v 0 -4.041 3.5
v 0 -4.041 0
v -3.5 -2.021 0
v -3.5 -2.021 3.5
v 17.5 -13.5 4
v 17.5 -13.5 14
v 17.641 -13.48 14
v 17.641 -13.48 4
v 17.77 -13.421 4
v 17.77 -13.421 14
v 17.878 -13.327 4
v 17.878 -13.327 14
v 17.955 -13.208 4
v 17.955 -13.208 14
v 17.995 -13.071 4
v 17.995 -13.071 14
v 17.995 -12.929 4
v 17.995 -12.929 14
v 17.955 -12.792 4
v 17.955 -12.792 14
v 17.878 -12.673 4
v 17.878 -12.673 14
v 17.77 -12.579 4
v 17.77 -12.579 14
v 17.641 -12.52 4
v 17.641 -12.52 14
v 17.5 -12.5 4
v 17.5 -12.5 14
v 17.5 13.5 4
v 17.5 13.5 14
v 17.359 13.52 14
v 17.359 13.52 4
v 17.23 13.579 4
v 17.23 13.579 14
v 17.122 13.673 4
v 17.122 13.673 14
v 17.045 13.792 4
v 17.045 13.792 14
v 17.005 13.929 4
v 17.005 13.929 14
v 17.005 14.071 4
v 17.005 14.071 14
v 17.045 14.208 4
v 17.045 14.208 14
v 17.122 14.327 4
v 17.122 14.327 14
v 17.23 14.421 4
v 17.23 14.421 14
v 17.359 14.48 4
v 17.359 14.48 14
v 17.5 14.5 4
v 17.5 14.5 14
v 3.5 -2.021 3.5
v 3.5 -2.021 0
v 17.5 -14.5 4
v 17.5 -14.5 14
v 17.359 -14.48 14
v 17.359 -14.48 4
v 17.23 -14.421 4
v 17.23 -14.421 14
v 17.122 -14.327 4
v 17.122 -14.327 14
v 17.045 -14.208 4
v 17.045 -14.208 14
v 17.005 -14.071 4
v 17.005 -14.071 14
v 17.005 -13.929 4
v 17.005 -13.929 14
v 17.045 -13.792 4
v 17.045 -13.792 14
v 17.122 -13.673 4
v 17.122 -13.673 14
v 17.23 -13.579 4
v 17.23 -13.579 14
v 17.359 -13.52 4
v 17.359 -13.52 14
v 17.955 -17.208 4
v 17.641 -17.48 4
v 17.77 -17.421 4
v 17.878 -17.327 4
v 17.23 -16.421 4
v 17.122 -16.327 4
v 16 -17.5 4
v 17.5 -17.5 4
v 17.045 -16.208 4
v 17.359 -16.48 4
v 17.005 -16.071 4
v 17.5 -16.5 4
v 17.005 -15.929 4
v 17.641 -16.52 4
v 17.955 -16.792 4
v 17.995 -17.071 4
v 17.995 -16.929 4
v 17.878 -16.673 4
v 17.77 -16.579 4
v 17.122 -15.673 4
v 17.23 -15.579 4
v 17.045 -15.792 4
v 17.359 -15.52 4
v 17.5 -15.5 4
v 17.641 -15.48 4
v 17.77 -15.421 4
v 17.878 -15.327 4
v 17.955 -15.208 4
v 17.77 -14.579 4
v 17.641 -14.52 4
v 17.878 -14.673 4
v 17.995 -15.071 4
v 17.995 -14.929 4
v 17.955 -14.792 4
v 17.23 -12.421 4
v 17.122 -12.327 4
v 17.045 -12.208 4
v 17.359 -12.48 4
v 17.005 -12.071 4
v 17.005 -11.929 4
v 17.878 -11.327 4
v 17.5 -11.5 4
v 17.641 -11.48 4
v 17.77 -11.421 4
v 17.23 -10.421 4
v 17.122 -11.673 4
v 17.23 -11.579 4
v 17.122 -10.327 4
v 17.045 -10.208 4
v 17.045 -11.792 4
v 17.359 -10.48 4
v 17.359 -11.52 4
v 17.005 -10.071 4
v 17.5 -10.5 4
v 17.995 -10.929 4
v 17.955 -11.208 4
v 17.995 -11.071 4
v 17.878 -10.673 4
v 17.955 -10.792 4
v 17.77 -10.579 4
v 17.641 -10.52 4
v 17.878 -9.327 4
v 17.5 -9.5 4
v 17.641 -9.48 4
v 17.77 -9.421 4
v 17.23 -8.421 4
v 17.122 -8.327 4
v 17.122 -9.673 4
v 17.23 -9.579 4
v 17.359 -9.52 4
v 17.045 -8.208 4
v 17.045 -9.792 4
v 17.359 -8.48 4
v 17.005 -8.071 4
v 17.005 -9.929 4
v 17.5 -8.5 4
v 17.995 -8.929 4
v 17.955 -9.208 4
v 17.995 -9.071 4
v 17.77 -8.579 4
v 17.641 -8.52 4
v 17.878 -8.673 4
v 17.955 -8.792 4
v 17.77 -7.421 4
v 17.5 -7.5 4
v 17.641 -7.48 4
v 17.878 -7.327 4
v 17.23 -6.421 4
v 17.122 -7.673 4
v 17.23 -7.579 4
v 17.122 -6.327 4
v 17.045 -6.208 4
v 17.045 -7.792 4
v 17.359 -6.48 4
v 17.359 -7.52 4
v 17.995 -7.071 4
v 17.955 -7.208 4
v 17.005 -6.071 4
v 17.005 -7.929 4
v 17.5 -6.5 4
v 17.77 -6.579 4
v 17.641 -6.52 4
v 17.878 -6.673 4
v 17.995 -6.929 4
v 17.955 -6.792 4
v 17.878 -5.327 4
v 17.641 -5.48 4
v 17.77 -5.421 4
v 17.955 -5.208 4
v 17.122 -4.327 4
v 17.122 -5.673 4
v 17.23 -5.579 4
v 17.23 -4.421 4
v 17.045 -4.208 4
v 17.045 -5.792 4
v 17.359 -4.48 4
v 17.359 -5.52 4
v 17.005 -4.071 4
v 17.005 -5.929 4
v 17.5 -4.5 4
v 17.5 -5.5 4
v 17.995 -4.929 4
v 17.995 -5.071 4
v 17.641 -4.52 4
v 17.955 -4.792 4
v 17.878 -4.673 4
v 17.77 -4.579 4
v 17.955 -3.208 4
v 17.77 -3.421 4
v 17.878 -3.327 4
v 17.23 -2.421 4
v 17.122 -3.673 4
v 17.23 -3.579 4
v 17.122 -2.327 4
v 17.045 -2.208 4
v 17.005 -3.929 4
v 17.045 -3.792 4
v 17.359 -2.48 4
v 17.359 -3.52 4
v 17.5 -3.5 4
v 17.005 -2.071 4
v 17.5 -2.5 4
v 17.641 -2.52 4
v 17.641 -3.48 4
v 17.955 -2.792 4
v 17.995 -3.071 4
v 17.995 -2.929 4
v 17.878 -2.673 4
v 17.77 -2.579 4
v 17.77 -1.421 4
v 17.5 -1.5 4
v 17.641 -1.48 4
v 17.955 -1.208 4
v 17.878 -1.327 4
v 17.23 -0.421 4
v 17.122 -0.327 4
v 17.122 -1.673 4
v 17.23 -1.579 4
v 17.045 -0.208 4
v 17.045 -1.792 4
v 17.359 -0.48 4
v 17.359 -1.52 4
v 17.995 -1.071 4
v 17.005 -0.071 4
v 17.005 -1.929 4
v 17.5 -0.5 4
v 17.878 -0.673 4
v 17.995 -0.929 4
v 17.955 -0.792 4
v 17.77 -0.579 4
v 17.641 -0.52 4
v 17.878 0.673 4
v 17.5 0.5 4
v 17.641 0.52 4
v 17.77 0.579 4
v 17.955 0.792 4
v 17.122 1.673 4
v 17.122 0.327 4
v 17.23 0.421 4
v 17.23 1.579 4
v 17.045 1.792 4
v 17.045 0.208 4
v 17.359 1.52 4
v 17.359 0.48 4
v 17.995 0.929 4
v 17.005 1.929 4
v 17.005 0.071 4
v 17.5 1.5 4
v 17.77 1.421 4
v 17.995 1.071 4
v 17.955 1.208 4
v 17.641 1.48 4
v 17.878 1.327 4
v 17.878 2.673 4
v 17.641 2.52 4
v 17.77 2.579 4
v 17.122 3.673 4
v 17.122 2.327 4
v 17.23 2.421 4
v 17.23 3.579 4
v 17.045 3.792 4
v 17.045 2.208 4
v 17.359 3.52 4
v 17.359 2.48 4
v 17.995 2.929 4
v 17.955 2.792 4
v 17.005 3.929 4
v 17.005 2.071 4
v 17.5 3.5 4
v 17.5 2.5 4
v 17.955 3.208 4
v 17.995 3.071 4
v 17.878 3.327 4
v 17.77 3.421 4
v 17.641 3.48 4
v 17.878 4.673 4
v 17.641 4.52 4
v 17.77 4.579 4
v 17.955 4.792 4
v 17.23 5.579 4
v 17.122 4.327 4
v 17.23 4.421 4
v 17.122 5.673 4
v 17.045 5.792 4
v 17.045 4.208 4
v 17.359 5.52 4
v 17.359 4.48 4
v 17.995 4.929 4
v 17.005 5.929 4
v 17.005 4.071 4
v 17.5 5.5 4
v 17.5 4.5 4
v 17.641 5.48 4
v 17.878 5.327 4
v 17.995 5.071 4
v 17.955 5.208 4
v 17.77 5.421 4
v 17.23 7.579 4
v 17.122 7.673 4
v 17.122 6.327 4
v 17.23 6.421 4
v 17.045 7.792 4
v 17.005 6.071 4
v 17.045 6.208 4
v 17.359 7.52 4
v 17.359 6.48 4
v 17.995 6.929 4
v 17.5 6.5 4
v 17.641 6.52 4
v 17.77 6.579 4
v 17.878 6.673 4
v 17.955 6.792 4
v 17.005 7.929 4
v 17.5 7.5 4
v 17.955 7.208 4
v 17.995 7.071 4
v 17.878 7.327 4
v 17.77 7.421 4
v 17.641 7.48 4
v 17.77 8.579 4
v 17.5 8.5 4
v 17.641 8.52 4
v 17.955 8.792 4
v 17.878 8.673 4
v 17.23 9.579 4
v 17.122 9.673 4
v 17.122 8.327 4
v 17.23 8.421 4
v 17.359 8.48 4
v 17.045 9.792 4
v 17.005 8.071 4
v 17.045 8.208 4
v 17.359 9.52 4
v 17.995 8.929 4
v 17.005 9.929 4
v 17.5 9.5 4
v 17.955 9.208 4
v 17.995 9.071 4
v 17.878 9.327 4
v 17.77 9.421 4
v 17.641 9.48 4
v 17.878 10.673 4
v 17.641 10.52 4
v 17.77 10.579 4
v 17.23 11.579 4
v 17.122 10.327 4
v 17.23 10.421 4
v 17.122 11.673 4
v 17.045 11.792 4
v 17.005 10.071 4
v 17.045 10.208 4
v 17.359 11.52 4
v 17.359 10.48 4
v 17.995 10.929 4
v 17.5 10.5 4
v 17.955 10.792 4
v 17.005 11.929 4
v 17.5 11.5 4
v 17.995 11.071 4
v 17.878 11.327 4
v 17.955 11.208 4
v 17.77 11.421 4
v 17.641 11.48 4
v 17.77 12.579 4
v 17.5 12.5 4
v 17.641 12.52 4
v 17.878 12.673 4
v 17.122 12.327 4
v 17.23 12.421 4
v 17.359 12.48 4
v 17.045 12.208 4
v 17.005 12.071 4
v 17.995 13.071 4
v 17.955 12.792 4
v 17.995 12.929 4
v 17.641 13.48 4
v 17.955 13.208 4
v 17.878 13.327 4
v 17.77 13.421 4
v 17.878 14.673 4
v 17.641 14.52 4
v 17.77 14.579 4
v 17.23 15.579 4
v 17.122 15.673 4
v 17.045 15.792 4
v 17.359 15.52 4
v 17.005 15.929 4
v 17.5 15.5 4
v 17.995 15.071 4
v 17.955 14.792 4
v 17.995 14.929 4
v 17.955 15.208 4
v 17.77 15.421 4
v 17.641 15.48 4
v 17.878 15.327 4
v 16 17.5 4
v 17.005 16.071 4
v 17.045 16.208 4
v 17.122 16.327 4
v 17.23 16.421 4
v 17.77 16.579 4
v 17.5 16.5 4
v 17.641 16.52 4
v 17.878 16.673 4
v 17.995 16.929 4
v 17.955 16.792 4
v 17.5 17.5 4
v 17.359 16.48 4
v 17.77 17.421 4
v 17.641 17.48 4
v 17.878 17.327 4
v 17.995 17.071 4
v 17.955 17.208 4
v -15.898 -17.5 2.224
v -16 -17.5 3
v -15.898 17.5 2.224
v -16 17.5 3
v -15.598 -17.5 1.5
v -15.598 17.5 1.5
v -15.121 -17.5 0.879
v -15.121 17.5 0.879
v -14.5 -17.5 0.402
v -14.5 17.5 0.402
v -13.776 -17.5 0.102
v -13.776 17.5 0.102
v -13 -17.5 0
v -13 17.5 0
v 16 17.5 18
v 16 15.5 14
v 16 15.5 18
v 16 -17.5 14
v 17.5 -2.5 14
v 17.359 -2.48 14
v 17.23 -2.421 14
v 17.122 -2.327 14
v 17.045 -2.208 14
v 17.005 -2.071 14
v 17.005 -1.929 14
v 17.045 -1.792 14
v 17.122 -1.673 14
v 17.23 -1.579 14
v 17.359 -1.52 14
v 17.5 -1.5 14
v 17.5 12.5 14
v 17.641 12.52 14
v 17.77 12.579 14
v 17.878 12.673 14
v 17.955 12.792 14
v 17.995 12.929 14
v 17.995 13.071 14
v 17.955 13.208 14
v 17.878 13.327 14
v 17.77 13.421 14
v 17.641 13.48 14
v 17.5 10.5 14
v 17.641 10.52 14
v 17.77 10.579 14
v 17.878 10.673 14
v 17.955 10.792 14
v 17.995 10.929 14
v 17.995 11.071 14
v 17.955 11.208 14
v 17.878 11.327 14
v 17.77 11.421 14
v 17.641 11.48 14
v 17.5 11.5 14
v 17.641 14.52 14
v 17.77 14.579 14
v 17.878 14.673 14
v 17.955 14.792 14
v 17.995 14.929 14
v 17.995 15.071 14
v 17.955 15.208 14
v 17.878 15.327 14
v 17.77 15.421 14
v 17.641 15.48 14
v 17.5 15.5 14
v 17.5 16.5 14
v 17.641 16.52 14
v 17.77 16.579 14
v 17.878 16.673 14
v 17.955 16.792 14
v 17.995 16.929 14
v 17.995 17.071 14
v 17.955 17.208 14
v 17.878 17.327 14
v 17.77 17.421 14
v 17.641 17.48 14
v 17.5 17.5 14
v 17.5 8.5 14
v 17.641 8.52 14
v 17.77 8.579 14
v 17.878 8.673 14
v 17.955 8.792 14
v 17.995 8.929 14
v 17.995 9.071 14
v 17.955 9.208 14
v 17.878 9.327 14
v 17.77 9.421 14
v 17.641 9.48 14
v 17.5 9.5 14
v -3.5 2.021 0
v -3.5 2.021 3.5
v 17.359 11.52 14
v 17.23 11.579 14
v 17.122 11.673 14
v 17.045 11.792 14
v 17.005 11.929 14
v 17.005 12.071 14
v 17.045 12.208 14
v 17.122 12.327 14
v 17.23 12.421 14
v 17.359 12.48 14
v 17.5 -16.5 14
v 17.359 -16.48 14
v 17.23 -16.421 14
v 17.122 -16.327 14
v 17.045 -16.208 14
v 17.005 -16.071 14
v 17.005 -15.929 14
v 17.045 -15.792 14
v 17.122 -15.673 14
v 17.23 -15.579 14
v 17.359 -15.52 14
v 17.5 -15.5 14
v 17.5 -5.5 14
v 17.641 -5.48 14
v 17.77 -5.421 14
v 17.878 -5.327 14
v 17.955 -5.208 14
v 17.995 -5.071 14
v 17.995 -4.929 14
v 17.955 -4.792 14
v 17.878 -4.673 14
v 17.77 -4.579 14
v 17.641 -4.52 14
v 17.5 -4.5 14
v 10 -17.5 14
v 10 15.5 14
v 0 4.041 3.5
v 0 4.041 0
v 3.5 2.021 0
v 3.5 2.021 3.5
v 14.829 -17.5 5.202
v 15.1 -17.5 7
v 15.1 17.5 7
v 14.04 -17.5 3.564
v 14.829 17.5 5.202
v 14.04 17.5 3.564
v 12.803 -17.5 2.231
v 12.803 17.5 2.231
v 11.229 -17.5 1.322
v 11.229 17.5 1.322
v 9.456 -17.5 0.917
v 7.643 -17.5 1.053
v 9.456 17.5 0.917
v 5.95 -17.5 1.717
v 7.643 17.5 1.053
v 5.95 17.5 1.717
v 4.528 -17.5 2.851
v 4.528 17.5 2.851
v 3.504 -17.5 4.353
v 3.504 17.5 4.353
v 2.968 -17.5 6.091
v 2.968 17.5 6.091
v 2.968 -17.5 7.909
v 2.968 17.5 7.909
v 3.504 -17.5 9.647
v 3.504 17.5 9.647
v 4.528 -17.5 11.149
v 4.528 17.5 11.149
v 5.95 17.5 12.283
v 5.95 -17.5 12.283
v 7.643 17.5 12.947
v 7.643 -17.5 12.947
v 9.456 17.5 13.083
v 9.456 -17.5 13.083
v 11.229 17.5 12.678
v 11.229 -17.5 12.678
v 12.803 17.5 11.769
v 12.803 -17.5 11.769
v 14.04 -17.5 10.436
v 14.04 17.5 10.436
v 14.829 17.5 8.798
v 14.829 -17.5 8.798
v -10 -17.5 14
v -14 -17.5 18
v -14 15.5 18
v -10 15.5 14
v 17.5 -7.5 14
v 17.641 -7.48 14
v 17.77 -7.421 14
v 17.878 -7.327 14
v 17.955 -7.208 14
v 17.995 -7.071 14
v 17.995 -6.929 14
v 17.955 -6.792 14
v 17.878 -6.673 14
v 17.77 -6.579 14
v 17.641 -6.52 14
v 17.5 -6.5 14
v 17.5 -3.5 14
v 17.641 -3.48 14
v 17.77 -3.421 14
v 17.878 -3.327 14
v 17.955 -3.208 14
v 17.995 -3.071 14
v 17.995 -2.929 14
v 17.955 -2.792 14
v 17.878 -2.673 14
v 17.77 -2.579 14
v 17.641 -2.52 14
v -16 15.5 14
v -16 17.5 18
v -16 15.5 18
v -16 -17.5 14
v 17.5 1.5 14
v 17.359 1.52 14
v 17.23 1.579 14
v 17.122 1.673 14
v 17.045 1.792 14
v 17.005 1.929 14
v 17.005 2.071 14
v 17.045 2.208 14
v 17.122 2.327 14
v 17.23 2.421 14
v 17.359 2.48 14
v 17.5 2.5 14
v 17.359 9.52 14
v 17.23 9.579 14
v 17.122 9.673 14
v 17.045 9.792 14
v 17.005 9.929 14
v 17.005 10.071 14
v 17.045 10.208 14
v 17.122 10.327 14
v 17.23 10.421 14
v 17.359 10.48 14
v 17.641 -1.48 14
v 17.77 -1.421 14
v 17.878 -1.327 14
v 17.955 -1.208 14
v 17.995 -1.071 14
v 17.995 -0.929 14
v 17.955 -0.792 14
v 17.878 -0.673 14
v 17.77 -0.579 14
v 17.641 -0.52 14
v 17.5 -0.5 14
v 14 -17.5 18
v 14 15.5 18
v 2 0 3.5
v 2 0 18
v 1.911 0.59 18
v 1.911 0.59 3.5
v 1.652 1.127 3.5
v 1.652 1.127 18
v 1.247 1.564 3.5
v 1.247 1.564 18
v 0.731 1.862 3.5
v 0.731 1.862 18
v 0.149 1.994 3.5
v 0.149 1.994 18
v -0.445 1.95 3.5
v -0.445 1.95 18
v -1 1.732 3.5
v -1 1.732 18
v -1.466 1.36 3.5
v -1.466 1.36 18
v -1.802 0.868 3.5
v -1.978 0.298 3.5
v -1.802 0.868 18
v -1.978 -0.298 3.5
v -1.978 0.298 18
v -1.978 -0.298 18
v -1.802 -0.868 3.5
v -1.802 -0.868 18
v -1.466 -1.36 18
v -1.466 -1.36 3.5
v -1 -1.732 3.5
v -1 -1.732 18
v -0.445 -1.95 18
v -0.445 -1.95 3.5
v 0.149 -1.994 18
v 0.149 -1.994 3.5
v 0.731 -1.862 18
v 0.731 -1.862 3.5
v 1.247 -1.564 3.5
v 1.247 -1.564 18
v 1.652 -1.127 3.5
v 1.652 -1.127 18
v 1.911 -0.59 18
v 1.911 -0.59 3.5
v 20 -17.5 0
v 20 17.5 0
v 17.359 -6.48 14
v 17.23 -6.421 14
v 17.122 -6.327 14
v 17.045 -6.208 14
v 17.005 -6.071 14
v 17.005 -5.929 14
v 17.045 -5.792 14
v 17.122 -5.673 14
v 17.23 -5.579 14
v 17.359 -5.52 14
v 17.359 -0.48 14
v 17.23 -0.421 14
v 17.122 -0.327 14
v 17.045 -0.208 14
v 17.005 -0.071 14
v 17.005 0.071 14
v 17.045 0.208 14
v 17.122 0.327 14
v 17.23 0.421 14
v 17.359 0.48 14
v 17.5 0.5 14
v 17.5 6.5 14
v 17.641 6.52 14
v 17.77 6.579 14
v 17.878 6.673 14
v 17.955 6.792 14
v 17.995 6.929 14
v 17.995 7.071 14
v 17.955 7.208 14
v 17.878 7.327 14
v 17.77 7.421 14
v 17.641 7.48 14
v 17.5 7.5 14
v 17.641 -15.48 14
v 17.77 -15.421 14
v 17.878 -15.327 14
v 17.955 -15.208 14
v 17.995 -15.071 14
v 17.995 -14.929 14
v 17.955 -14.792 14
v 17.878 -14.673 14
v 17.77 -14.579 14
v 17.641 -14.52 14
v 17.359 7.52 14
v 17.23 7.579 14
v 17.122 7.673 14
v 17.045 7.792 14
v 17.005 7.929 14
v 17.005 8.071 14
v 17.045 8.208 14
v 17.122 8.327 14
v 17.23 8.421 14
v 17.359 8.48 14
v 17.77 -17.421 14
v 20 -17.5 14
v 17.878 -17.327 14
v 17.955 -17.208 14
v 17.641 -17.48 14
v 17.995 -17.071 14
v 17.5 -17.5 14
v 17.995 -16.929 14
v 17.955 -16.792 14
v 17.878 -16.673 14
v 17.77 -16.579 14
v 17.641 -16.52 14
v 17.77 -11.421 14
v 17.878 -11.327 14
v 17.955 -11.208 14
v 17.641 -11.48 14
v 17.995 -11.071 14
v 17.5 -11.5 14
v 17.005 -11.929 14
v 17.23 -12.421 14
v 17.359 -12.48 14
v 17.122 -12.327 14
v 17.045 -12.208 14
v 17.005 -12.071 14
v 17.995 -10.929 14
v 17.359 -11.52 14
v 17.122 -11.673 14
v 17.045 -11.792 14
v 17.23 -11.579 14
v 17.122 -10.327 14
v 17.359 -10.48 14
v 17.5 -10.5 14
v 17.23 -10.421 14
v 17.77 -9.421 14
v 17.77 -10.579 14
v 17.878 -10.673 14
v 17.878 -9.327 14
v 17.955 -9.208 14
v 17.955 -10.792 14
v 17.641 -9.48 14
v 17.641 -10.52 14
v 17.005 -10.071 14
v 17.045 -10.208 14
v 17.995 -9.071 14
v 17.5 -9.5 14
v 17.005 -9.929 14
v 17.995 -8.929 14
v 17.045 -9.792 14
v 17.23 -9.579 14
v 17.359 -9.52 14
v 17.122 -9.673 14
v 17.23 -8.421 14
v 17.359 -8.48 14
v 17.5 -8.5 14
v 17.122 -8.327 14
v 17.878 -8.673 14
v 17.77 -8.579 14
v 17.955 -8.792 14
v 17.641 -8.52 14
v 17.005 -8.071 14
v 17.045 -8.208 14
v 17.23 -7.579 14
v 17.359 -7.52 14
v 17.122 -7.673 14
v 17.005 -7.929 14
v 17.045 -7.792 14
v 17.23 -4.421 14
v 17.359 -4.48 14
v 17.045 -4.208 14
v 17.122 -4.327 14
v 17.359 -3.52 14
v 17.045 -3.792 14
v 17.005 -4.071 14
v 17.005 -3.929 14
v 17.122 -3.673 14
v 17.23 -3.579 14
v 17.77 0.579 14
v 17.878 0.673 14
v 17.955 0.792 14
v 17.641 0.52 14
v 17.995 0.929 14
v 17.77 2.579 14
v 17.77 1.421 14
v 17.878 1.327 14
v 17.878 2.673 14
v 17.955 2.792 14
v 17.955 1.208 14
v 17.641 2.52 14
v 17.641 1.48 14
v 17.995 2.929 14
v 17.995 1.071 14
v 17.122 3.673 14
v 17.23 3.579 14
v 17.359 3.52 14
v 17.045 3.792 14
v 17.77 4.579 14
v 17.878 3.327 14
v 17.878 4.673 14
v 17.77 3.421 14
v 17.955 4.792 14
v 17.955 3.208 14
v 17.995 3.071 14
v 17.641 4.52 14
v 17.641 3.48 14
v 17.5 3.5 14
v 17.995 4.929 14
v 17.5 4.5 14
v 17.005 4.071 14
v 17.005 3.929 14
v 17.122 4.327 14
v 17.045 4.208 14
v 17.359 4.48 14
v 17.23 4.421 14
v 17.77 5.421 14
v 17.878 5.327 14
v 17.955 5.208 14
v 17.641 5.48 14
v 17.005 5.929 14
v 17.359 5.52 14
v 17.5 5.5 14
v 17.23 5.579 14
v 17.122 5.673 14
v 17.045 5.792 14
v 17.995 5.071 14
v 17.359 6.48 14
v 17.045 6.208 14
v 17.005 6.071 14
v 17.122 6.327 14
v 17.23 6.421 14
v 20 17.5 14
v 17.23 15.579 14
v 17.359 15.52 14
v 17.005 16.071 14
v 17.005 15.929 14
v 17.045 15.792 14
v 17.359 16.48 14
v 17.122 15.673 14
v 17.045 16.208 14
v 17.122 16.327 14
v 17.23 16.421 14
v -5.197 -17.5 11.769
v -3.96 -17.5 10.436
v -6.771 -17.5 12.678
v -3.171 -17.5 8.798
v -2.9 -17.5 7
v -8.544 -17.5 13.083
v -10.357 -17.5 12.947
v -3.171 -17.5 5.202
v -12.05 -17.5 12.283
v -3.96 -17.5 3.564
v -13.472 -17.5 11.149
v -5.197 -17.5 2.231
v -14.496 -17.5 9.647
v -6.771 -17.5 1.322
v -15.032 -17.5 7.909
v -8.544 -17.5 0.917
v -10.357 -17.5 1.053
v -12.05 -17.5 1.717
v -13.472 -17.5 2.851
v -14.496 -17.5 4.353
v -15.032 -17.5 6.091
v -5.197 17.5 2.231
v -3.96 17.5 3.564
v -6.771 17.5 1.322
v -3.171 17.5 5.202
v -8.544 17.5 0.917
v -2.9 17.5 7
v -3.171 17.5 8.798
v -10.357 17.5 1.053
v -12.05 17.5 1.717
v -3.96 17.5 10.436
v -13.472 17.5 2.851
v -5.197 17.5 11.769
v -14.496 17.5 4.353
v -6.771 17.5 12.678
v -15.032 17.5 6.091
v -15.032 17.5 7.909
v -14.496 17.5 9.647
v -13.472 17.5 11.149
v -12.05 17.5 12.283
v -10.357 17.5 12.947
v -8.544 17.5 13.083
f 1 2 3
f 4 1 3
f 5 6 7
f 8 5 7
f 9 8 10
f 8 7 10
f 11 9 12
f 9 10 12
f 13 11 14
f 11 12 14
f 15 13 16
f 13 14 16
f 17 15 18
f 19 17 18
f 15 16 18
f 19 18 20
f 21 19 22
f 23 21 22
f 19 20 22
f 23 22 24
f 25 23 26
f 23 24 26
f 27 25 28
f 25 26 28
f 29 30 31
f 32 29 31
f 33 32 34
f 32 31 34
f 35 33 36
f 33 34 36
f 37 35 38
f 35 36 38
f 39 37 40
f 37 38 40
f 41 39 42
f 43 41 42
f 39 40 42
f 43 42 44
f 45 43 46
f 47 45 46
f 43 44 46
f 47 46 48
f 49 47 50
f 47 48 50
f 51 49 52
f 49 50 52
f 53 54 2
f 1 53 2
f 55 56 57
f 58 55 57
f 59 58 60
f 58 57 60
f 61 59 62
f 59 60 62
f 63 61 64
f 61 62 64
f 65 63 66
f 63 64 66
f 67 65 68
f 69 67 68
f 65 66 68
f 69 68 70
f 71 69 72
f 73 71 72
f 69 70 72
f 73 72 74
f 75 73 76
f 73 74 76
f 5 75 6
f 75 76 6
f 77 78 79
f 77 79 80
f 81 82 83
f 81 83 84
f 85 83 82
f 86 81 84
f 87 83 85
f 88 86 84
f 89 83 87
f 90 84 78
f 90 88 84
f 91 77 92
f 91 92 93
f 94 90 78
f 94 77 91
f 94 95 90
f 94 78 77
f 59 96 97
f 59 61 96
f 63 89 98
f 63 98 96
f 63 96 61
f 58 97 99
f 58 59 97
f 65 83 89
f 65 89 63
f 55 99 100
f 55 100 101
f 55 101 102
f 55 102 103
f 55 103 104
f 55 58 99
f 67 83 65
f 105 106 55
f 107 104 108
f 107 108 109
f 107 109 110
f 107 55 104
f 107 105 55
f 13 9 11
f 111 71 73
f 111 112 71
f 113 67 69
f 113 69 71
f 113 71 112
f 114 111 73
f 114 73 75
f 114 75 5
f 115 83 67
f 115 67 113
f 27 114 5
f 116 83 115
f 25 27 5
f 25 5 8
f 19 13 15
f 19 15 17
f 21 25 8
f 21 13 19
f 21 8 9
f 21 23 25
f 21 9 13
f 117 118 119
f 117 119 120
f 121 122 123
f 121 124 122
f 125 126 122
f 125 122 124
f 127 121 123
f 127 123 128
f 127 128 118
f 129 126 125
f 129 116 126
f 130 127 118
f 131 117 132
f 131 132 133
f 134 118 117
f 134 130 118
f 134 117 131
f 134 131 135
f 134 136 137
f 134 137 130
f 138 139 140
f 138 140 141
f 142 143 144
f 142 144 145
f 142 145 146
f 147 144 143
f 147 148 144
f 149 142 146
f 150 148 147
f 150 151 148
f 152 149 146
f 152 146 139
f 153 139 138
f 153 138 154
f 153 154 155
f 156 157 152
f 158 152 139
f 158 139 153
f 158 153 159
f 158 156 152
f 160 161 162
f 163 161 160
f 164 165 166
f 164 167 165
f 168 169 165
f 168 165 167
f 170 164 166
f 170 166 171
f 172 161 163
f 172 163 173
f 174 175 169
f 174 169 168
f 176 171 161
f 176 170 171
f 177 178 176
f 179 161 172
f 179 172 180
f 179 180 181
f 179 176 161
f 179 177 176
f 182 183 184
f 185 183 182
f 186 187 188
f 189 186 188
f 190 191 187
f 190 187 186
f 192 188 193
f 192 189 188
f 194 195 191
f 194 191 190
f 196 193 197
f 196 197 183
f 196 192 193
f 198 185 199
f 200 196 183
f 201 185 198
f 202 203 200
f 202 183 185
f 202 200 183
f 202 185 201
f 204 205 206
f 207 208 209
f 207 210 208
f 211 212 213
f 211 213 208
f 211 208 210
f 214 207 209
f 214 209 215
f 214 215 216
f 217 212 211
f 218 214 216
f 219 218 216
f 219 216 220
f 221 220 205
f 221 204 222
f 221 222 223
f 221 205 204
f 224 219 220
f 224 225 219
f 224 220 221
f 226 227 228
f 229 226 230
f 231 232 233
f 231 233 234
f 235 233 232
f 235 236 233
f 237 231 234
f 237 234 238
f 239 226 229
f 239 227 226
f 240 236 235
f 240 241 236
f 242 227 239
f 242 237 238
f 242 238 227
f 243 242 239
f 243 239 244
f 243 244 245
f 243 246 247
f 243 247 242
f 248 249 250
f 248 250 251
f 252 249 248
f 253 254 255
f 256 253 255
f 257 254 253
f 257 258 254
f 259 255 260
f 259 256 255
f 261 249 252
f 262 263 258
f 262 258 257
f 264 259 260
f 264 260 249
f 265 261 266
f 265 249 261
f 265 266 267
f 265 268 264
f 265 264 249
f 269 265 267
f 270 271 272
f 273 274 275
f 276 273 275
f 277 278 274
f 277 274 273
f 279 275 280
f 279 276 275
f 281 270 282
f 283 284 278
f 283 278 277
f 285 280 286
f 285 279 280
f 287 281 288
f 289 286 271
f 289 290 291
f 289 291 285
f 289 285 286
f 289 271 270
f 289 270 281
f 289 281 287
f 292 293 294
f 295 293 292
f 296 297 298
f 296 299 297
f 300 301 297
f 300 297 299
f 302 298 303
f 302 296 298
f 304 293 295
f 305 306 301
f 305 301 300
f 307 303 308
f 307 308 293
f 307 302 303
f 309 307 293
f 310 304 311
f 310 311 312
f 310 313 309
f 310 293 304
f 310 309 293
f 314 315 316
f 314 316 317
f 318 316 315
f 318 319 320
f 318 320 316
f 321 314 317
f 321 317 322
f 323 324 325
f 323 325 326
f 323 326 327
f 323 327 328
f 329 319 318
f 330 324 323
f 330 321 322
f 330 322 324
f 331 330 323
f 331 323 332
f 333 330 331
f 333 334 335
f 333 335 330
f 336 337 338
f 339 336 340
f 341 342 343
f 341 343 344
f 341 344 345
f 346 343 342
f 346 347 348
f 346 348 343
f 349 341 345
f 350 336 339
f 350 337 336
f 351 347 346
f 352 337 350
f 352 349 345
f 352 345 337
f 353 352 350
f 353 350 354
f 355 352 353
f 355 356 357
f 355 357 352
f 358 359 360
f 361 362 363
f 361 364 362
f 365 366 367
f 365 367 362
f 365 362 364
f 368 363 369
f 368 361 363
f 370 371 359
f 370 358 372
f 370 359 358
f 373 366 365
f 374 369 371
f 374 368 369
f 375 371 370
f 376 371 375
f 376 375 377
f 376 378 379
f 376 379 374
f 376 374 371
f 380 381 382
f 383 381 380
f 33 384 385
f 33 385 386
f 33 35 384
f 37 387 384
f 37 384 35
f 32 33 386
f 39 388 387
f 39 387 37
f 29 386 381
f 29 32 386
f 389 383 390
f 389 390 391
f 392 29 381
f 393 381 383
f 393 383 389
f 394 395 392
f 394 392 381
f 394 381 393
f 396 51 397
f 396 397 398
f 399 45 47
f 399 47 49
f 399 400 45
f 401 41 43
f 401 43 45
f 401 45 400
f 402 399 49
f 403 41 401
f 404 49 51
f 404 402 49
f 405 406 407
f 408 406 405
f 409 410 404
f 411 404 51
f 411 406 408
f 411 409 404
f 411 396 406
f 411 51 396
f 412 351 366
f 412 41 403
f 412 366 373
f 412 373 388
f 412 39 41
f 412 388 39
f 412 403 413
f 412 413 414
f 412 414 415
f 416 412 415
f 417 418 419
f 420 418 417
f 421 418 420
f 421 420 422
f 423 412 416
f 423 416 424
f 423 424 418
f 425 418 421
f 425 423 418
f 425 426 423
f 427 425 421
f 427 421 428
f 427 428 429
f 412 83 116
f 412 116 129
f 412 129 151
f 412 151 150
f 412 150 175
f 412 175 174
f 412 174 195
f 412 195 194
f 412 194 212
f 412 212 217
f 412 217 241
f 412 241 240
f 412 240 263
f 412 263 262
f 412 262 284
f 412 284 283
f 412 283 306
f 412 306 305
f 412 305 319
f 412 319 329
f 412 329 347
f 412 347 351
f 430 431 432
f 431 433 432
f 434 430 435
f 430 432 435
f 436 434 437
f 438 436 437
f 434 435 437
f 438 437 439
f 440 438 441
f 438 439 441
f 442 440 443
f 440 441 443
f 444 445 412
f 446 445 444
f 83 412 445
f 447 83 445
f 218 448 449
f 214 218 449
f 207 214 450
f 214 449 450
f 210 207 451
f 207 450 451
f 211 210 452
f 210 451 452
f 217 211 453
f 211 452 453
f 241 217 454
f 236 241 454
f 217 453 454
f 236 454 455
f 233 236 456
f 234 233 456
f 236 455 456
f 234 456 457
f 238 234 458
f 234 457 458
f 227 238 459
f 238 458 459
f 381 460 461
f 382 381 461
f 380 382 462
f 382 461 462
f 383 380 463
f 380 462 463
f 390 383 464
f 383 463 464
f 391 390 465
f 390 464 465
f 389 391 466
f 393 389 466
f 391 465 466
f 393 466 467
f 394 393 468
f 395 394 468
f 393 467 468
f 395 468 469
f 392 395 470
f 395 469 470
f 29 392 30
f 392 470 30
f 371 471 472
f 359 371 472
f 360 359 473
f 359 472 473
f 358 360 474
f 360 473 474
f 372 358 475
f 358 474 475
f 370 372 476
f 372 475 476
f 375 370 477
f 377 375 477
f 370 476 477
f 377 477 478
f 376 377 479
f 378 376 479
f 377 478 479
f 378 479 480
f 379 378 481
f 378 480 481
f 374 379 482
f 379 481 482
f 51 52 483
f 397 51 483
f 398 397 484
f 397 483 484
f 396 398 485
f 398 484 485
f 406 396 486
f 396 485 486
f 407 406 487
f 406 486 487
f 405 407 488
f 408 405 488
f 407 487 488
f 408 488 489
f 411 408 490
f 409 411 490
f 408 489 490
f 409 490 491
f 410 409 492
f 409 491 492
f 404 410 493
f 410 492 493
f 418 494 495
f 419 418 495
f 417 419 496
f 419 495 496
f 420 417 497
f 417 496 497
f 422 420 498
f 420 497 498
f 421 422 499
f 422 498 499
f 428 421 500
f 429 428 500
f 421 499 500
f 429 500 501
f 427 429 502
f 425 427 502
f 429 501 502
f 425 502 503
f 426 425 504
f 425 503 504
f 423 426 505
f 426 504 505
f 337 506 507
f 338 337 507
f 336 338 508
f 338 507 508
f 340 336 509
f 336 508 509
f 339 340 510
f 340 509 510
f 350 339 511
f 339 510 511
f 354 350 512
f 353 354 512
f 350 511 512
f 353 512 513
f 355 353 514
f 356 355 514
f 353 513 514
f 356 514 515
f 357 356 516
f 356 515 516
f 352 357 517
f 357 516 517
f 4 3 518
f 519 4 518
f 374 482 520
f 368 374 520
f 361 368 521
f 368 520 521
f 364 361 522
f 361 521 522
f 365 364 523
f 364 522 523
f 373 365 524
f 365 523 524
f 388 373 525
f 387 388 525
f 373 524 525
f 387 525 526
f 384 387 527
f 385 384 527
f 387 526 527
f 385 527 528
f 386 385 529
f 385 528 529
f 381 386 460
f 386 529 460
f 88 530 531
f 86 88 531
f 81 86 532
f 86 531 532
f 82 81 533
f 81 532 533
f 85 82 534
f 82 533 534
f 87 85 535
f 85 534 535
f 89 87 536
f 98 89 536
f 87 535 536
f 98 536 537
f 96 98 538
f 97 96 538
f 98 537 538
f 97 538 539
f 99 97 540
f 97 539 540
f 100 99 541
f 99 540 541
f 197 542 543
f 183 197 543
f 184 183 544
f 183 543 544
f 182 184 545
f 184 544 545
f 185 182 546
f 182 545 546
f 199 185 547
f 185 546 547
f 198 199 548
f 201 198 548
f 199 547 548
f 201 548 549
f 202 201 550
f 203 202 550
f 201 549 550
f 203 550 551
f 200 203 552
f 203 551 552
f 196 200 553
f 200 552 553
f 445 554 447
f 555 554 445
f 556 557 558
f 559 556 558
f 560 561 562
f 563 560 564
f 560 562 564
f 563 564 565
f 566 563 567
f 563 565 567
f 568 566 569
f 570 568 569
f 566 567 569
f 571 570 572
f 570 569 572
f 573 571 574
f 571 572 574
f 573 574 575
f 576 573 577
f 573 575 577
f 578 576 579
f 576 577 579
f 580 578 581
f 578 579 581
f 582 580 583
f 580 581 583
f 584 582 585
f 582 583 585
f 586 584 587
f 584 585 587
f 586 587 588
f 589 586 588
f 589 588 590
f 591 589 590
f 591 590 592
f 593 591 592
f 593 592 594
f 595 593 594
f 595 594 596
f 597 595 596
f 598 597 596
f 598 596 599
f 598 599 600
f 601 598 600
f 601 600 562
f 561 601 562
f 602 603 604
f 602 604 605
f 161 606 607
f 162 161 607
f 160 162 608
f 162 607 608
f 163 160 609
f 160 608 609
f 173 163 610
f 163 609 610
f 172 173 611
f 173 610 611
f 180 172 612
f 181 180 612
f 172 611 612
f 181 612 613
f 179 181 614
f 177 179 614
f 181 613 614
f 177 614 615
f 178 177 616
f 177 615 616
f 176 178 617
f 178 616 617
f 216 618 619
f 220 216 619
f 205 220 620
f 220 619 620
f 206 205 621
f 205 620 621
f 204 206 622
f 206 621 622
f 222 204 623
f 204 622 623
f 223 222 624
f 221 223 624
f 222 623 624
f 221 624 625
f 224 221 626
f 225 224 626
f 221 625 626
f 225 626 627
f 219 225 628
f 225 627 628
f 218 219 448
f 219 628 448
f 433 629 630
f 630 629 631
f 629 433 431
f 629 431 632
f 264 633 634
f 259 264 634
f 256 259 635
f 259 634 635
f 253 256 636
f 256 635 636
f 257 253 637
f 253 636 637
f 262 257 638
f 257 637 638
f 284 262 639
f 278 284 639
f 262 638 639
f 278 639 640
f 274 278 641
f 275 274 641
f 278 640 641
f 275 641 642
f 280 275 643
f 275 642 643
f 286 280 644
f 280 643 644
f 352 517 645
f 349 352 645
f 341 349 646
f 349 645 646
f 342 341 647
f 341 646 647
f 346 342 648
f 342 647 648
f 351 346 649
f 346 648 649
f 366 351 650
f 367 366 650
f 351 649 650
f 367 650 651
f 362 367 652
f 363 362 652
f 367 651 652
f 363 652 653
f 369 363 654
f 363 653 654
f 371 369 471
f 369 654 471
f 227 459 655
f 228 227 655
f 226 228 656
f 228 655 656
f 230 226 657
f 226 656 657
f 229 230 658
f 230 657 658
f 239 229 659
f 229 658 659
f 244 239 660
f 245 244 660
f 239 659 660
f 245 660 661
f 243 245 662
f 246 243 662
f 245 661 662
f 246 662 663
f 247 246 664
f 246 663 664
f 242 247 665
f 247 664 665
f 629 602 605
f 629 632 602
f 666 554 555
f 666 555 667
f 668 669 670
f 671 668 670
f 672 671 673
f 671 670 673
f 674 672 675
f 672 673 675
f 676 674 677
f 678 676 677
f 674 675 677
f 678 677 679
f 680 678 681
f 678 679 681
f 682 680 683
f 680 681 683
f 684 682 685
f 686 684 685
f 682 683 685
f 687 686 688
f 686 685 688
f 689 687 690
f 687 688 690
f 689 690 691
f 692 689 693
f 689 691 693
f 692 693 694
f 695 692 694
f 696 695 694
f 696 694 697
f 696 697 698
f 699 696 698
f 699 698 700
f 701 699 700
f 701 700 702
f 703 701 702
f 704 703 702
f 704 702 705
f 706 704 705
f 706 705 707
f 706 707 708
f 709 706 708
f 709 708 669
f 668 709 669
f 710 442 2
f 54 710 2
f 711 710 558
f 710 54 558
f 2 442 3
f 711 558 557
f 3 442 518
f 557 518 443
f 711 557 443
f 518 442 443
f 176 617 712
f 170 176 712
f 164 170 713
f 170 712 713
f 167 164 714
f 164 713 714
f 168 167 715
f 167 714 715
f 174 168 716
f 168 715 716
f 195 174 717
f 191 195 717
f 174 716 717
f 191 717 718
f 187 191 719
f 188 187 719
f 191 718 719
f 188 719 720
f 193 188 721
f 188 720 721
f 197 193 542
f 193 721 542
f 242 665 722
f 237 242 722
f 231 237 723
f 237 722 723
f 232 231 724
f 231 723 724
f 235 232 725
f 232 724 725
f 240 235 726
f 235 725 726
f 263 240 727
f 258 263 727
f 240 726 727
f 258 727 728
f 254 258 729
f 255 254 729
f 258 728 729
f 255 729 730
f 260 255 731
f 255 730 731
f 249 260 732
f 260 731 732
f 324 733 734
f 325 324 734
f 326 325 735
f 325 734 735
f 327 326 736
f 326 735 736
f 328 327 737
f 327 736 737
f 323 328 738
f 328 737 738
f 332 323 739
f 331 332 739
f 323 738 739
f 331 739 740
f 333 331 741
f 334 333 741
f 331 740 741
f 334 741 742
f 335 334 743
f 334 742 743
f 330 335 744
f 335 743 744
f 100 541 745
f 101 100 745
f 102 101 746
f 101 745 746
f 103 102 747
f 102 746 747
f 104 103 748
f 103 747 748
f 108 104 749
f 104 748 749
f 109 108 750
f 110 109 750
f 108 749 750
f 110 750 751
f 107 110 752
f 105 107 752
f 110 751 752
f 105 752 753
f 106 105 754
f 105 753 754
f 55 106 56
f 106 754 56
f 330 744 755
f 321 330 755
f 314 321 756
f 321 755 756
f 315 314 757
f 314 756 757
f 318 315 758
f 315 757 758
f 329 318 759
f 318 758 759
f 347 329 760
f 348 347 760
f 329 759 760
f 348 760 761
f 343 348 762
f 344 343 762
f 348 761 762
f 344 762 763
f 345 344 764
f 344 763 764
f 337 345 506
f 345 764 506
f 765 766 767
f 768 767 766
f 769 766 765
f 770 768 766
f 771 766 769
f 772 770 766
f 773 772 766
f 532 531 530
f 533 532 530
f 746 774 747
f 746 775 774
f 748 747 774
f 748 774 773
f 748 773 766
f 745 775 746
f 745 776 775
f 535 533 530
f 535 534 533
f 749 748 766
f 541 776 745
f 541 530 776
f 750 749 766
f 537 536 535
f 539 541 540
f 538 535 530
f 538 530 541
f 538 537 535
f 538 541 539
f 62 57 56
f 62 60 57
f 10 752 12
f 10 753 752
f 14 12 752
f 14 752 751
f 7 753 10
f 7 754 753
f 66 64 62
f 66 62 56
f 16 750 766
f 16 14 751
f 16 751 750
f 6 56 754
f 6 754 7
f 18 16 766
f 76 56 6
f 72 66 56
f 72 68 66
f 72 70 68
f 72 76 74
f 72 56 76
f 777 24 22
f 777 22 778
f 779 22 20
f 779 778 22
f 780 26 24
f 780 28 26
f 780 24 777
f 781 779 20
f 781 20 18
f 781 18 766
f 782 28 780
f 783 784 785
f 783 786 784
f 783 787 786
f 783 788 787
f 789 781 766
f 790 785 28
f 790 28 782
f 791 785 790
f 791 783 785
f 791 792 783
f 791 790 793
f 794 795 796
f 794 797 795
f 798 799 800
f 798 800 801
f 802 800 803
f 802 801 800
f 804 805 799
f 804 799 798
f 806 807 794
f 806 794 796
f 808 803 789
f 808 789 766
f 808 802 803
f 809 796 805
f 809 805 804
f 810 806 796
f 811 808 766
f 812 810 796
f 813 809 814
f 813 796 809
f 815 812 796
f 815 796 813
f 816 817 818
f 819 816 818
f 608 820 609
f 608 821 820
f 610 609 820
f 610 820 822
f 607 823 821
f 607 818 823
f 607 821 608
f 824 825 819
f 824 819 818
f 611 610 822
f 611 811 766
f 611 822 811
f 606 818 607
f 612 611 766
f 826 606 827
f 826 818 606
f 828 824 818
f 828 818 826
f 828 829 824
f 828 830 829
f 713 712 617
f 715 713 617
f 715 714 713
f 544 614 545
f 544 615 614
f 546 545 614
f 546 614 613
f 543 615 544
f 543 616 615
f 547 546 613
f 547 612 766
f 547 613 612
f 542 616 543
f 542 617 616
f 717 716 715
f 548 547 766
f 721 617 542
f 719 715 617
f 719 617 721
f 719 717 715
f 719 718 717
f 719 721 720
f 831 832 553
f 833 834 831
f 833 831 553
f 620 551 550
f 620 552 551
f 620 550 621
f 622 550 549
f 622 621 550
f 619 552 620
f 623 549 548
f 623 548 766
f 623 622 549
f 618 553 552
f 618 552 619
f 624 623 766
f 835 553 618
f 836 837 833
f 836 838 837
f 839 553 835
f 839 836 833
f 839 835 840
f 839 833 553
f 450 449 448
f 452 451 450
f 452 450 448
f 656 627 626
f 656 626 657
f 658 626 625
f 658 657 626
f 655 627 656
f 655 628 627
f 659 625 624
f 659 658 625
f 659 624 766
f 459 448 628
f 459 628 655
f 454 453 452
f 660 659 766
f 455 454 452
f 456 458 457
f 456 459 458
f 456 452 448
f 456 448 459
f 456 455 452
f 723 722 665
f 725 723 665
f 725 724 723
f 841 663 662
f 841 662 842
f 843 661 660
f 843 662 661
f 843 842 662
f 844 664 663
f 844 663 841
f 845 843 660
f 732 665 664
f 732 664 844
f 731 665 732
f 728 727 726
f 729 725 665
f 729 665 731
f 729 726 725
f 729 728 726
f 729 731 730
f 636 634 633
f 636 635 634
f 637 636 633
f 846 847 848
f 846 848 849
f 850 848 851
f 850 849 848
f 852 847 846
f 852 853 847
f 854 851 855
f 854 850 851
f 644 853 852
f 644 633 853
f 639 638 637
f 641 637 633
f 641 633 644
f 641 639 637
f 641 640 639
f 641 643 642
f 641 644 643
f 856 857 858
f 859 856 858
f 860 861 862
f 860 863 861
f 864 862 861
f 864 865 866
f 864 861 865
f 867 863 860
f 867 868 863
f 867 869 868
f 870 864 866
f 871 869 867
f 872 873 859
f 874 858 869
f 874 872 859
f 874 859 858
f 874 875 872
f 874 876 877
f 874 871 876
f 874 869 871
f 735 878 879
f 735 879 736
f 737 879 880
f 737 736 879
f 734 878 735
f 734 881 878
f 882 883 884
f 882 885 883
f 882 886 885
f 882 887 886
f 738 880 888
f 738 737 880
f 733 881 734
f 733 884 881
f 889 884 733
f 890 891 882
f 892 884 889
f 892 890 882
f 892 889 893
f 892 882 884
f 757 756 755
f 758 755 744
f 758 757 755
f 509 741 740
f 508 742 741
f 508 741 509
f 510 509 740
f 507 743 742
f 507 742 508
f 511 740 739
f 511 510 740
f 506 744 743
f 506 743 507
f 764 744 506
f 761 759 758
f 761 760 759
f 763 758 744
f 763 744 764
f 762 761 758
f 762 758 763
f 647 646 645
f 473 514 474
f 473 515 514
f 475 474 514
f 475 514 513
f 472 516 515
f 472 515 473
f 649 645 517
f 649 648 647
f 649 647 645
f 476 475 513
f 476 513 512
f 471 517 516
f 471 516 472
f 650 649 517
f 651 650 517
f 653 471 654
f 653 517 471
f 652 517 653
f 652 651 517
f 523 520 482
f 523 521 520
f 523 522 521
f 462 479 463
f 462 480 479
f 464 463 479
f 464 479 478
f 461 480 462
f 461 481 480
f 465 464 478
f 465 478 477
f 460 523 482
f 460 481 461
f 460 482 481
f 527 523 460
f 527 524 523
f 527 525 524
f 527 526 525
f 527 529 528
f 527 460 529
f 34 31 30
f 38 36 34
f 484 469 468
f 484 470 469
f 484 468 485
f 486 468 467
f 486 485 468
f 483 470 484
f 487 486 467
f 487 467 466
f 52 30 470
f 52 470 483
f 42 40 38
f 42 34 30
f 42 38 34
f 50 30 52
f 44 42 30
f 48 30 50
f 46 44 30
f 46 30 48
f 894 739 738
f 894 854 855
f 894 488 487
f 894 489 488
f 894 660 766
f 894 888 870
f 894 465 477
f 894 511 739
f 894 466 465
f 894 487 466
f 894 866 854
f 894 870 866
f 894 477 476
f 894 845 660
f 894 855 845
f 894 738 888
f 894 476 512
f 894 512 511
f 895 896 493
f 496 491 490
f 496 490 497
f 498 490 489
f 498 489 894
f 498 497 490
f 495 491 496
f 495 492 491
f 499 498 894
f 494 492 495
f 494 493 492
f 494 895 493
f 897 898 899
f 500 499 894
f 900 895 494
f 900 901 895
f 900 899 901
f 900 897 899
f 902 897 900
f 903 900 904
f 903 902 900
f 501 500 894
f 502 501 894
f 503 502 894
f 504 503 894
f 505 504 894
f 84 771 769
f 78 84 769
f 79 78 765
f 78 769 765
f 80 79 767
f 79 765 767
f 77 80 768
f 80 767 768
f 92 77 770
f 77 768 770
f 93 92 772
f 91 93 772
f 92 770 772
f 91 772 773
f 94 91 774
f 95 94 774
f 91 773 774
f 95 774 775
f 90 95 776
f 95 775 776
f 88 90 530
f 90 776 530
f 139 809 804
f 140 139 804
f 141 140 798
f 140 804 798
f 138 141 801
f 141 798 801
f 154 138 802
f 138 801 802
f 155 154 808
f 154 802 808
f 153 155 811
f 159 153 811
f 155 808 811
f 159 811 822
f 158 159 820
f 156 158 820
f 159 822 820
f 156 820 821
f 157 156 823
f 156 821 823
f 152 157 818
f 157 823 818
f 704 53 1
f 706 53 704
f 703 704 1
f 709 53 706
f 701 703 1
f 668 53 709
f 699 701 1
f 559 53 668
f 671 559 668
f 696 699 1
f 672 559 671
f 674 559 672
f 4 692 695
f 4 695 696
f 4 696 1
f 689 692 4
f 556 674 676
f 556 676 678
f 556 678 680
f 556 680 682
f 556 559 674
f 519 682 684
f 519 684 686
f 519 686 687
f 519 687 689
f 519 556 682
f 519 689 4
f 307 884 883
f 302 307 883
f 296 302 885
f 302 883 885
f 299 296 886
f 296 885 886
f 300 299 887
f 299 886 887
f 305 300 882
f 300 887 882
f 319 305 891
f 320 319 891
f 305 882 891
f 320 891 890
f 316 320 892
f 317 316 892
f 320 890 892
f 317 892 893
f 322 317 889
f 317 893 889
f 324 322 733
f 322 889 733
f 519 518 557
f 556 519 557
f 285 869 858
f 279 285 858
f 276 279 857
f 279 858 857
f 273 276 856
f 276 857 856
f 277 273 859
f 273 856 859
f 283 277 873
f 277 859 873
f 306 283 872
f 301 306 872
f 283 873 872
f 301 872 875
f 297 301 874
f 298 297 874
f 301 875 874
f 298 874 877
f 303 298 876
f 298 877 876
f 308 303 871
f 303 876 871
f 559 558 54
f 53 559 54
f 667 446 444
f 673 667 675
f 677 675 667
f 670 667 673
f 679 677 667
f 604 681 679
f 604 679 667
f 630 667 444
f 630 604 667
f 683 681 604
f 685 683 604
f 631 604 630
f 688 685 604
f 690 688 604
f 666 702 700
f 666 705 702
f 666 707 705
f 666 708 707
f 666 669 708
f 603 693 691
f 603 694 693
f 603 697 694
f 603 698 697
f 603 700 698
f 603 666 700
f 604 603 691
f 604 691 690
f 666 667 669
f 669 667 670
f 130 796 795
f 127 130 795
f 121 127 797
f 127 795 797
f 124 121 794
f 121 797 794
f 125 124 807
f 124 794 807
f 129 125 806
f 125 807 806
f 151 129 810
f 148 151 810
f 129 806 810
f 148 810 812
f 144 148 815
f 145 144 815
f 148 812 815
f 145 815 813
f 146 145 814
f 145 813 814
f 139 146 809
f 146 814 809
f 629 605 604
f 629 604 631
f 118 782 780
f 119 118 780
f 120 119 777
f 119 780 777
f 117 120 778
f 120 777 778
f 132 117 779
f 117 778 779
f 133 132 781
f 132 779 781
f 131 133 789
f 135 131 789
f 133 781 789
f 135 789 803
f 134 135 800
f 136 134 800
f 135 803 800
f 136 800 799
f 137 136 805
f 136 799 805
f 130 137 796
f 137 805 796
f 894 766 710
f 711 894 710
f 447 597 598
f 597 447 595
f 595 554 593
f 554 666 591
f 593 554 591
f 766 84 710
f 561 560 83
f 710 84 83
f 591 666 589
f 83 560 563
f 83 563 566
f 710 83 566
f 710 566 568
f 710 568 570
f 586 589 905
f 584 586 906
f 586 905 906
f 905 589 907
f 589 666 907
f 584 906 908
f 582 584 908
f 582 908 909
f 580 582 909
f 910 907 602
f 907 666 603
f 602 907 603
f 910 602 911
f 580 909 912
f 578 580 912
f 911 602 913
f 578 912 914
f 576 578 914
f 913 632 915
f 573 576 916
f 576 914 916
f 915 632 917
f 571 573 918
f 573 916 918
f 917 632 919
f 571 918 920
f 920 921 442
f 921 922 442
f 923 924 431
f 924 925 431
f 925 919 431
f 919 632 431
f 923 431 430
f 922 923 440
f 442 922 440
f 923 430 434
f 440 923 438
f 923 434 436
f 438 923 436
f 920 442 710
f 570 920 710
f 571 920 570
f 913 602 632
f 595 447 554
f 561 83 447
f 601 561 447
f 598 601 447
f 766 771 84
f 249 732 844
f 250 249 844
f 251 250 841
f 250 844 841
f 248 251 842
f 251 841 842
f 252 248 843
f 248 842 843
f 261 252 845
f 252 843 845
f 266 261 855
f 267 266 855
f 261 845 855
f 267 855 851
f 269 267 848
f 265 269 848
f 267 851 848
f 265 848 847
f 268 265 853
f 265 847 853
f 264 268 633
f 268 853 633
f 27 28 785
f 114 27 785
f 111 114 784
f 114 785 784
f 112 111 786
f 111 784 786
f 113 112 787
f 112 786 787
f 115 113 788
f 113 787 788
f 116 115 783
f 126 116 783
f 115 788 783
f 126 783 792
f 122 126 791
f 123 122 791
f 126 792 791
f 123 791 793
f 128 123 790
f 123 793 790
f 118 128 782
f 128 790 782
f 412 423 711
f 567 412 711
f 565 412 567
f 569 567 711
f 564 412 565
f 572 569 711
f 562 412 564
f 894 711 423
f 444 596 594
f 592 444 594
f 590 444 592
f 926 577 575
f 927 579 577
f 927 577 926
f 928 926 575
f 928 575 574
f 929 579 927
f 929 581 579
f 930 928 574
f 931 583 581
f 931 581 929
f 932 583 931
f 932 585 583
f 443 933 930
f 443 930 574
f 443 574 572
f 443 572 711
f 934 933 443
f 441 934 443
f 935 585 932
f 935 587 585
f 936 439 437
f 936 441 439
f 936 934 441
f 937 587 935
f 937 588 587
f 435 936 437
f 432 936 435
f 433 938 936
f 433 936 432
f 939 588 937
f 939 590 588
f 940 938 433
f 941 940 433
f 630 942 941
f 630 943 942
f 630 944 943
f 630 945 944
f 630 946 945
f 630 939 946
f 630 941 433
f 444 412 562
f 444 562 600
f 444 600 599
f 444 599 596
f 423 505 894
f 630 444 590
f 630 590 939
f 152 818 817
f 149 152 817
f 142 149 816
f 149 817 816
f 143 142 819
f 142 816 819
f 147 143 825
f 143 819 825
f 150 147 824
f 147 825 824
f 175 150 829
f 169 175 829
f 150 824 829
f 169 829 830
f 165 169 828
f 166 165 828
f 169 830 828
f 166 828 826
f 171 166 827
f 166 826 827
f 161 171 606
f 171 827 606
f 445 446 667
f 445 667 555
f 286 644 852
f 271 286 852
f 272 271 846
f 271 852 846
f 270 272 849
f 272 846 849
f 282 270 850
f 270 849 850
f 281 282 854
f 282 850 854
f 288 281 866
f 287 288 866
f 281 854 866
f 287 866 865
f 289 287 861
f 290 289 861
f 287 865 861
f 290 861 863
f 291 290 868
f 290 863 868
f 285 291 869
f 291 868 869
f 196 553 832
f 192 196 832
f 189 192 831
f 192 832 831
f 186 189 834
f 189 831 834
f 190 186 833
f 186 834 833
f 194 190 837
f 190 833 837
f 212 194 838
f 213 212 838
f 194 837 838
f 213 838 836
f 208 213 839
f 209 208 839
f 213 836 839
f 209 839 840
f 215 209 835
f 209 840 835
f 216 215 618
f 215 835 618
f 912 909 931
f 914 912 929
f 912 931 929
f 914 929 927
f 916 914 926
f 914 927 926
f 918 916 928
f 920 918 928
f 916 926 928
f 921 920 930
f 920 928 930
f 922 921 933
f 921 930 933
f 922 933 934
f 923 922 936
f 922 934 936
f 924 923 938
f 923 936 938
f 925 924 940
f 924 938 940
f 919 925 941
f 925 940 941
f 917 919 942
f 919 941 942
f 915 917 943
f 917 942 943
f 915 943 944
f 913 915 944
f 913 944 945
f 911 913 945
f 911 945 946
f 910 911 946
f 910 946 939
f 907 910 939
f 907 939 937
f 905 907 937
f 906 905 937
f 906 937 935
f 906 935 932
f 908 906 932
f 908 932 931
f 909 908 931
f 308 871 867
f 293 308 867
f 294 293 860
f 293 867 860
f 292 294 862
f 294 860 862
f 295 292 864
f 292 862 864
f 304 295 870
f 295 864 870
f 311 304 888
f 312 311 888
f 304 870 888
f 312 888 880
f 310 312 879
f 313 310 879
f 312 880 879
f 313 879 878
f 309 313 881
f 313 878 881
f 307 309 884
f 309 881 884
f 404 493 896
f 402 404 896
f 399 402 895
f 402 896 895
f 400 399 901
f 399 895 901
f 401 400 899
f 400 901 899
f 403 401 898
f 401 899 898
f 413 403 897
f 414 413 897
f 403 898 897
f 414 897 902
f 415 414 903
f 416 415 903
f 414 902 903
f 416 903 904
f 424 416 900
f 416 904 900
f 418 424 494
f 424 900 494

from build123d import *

# Parameters (mm, degrees)
SKETCH_1_W          = 32
SKETCH_1_H          = 35
EXTRUDE_1_DEPTH     = 14
CUT_EXTRUDE_1_REACH = 37
SKETCH_2_R          = 6.1
EXTRUDE_2_DEPTH     = 33
FILLET_1_R          = 3
SKETCH_6_W          = 14
SKETCH_6_H          = 35
EXTRUDE_4_DEPTH     = 4
CUT_EXTRUDE_2_DEPTH = 10
SKETCH_5_W          = 32
SKETCH_5_H          = 4
EXTRUDE_5_DEPTH     = 2
CUT_EXTRUDE_3_REACH = 20
SKETCH_8_R          = 2
CUT_EXTRUDE_4_DEPTH = 3.5


with BuildPart() as part:
    # Эскиз1 → Бобышка-Вытянуть1 (new body)
    with BuildSketch(Plane.XY):
        Rectangle(SKETCH_1_W, SKETCH_1_H)
    extrude(amount=EXTRUDE_1_DEPTH)

    # Эскиз2 → Вырез-Вытянуть1 (cut, up to next)
    with BuildSketch(Plane(origin=(0, 17.5, 0), x_dir=(1, 0, 0), z_dir=(0, 1, 0)), mode=Mode.PRIVATE) as cut_extrude_1_sk1:
        with Locations((-9, -7)):
            Circle(SKETCH_2_R)
    cut_extrude_1_tool1 = extrude(cut_extrude_1_sk1.sketch, amount=-CUT_EXTRUDE_1_REACH, mode=Mode.PRIVATE) & part.part
    add(cut_extrude_1_tool1.solids().sort_by_distance((-9, 17.5, 7))[0], mode=Mode.SUBTRACT)
    # Эскиз2 → Вырез-Вытянуть1 (cut, up to next)
    with BuildSketch(Plane(origin=(0, 17.5, 0), x_dir=(1, 0, 0), z_dir=(0, 1, 0)), mode=Mode.PRIVATE) as cut_extrude_1_sk2:
        with Locations((9, -7)):
            Circle(SKETCH_2_R)
    cut_extrude_1_tool2 = extrude(cut_extrude_1_sk2.sketch, amount=-CUT_EXTRUDE_1_REACH, mode=Mode.PRIVATE) & part.part
    add(cut_extrude_1_tool2.solids().sort_by_distance((9, 17.5, 7))[0], mode=Mode.SUBTRACT)

    # Эскиз3 → Бобышка-Вытянуть2 (add)
    with BuildSketch(Plane(origin=(0, -17.5, 0), x_dir=(1, 0, 0), z_dir=(0, 1, 0))):
        Polygon((-14, -18), (-10, -14), (10, -14), (14, -18), align=None)
    extrude(amount=EXTRUDE_2_DEPTH)

    # Скругление1
    fillet_1_edges = [part.edges().sort_by_distance(p)[0] for p in [
        (-16, 0, 0),
    ]]
    fillet(fillet_1_edges, radius=FILLET_1_R)

    # Эскиз6 → Бобышка-Вытянуть4 (add)
    with BuildSketch(Plane(origin=(16, 0, 0), x_dir=(0, 0, -1), z_dir=(1, 0, 0))):
        with Locations((-7, 0)):
            Rectangle(SKETCH_6_W, SKETCH_6_H)
    extrude(amount=EXTRUDE_4_DEPTH)

    # Эскиз7 → Вырез-Вытянуть2 (cut)
    with BuildSketch(Plane.XY.offset(14)):
        with BuildLine():
            Line((16, -17.5), (17.5, -17.5))
            ThreePointArc((17.5, -17.5), (18, -17), (17.5, -16.5))
            ThreePointArc((17.5, -16.5), (17, -16), (17.5, -15.5))
            ThreePointArc((17.5, -15.5), (18, -15), (17.5, -14.5))
            ThreePointArc((17.5, -14.5), (17, -14), (17.5, -13.5))
            ThreePointArc((17.5, -13.5), (18, -13), (17.5, -12.5))
            ThreePointArc((17.5, -12.5), (17, -12), (17.5, -11.5))
            ThreePointArc((17.5, -11.5), (18, -11), (17.5, -10.5))
            ThreePointArc((17.5, -10.5), (17, -10), (17.5, -9.5))
            ThreePointArc((17.5, -9.5), (18, -9), (17.5, -8.5))
            ThreePointArc((17.5, -8.5), (17, -8), (17.5, -7.5))
            ThreePointArc((17.5, -7.5), (18, -7), (17.5, -6.5))
            ThreePointArc((17.5, -6.5), (17, -6), (17.5, -5.5))
            ThreePointArc((17.5, -5.5), (18, -5), (17.5, -4.5))
            ThreePointArc((17.5, -4.5), (17, -4), (17.5, -3.5))
            ThreePointArc((17.5, -3.5), (18, -3), (17.5, -2.5))
            ThreePointArc((17.5, -2.5), (17, -2), (17.5, -1.5))
            ThreePointArc((17.5, -1.5), (18, -1), (17.5, -0.5))
            ThreePointArc((17.5, -0.5), (17, 0), (17.5, 0.5))
            ThreePointArc((17.5, 0.5), (18, 1), (17.5, 1.5))
            ThreePointArc((17.5, 1.5), (17, 2), (17.5, 2.5))
            ThreePointArc((17.5, 2.5), (18, 3), (17.5, 3.5))
            ThreePointArc((17.5, 3.5), (17, 4), (17.5, 4.5))
            ThreePointArc((17.5, 4.5), (18, 5), (17.5, 5.5))
            ThreePointArc((17.5, 5.5), (17, 6), (17.5, 6.5))
            ThreePointArc((17.5, 6.5), (18, 7), (17.5, 7.5))
            ThreePointArc((17.5, 7.5), (17, 8), (17.5, 8.5))
            ThreePointArc((17.5, 8.5), (18, 9), (17.5, 9.5))
            ThreePointArc((17.5, 9.5), (17, 10), (17.5, 10.5))
            ThreePointArc((17.5, 10.5), (18, 11), (17.5, 11.5))
            ThreePointArc((17.5, 11.5), (17, 12), (17.5, 12.5))
            ThreePointArc((17.5, 12.5), (18, 13), (17.5, 13.5))
            ThreePointArc((17.5, 13.5), (17, 14), (17.5, 14.5))
            ThreePointArc((17.5, 14.5), (18, 15), (17.5, 15.5))
            ThreePointArc((17.5, 15.5), (17, 16), (17.5, 16.5))
            ThreePointArc((17.5, 16.5), (18, 17), (17.5, 17.5))
            Line((17.5, 17.5), (16, 17.5))
            Line((16, 17.5), (16, -17.5))
        make_face()
    extrude(amount=-CUT_EXTRUDE_2_DEPTH, mode=Mode.SUBTRACT)

    # Эскиз5 → Бобышка-Вытянуть5 (add)
    with BuildSketch(Plane(origin=(0, 15.5, 0), x_dir=(-1, 0, 0), z_dir=(0, 1, 0))):
        with Locations((0, 16)):
            Rectangle(SKETCH_5_W, SKETCH_5_H)
    extrude(amount=EXTRUDE_5_DEPTH)

    # Эскиз8 → Вырез-Вытянуть3 (cut, up to next)
    with BuildSketch(Plane.XY.offset(18), mode=Mode.PRIVATE) as cut_extrude_3_sk1:
        Circle(SKETCH_8_R)
    cut_extrude_3_tool1 = extrude(cut_extrude_3_sk1.sketch, amount=-CUT_EXTRUDE_3_REACH, mode=Mode.PRIVATE) & part.part
    add(cut_extrude_3_tool1.solids().sort_by_distance((0, 0, 18))[0], mode=Mode.SUBTRACT)

    # Эскиз9 → Вырез-Вытянуть4 (cut)
    with BuildSketch(Plane(origin=(0, 0, 0), x_dir=(-1, 0, 0), z_dir=(0, 0, -1))):
        Polygon((0, -4.041451884), (3.5, -2.020725942), (3.5, 2.020725942), (0, 4.041451884), (-3.5, 2.020725942), (-3.5, -2.020725942), align=None)
    extrude(amount=-CUT_EXTRUDE_4_DEPTH, mode=Mode.SUBTRACT)


solid = part.part
